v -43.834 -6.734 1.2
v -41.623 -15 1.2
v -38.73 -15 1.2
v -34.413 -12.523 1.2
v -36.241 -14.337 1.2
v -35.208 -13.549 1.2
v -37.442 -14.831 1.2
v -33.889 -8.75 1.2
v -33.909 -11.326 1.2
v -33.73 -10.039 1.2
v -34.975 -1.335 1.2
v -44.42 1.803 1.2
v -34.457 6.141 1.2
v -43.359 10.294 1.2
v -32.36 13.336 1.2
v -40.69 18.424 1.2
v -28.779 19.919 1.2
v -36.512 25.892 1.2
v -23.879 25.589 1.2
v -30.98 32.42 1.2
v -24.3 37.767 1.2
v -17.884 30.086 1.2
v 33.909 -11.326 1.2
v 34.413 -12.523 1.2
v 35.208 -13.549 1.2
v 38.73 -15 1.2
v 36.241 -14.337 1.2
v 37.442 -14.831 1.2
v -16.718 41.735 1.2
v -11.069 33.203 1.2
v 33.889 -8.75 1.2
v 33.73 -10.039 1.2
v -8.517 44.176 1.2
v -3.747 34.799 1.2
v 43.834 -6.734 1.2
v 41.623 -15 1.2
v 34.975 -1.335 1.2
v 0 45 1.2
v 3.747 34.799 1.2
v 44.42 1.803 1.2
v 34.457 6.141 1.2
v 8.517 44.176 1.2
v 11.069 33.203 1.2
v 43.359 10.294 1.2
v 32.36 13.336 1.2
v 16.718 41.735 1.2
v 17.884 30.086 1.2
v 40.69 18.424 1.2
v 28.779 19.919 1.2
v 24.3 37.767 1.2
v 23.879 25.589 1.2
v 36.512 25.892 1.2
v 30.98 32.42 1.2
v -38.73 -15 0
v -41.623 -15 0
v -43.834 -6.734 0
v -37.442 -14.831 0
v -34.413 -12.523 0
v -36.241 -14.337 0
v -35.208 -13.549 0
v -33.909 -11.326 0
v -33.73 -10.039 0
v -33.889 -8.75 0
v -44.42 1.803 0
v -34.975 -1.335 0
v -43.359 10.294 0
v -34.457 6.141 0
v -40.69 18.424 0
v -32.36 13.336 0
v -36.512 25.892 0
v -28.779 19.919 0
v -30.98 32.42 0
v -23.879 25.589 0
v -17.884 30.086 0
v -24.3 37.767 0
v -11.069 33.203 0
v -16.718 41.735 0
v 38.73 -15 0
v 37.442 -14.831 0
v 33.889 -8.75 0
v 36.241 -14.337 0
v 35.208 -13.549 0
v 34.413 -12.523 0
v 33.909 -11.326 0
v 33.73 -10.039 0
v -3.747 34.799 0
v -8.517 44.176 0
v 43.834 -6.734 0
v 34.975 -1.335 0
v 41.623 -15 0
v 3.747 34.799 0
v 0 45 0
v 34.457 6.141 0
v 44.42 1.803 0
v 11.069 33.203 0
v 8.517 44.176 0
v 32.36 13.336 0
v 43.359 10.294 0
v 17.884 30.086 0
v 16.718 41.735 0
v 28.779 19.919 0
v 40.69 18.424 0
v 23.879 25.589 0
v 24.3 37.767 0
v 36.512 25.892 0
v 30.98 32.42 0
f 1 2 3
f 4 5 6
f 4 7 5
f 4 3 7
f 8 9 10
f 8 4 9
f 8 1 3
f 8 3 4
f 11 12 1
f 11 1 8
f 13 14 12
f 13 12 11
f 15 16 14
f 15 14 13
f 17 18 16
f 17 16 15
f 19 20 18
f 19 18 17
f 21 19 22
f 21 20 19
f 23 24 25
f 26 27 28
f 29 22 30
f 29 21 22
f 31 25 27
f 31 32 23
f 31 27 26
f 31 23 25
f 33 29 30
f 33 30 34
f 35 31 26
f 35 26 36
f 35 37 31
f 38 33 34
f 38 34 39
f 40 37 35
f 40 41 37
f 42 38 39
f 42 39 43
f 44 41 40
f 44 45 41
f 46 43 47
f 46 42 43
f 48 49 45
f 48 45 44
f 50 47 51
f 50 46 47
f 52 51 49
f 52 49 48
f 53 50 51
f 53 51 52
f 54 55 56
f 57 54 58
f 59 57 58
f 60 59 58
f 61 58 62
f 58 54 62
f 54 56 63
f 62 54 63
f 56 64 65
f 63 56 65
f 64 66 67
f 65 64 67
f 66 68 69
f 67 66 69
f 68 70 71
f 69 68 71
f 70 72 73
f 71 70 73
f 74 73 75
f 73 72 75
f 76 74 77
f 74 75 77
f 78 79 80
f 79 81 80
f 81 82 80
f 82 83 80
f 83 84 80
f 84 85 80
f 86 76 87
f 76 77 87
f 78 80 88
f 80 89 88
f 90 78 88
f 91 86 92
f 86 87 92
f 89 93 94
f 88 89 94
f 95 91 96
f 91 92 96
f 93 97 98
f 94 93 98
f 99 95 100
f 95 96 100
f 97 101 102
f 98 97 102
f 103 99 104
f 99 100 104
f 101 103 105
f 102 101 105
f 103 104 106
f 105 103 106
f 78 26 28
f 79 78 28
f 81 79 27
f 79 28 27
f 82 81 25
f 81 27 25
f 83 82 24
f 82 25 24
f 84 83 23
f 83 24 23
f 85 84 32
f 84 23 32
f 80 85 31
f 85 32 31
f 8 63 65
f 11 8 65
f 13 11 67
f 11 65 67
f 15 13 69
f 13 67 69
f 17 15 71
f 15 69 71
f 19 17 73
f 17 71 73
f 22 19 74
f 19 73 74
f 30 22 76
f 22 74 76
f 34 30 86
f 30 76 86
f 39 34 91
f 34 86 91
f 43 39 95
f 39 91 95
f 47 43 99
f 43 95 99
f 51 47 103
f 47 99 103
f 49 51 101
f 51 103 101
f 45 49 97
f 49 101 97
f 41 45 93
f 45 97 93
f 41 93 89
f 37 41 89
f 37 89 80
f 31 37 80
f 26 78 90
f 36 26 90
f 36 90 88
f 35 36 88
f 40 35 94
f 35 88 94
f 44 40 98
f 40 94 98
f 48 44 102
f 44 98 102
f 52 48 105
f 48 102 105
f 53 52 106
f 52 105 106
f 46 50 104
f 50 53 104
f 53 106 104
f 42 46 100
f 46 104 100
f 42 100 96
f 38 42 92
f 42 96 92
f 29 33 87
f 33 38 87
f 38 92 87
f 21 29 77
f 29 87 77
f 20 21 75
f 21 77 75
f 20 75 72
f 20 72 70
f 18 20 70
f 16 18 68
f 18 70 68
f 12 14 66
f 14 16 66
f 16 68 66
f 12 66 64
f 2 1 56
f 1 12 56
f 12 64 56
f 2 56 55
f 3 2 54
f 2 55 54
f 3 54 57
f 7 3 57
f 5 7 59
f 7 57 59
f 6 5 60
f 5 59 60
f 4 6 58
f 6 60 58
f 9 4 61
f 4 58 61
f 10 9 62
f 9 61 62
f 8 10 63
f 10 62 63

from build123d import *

# Parameters (mm, degrees)
F1_DEPTH = 1.2
F3_DEPTH = 10
F5_DEPTH = 135
F6_R     = 5
F7_R     = 63.736196
F8_DEPTH = 1.2


with BuildPart() as f1:
    # F0 (on Top) → F1 (new body)
    with BuildSketch(Plane.XY):
        with BuildLine():
            ThreePointArc((-31.622777, -15), (0, 35), (31.622777, -15))
            Line((31.622777, -15), (41.622777, -15))
            ThreePointArc((41.622777, -15), (0, 45), (-41.622777, -15))
            Line((-41.622777, -15), (-31.622777, -15))
        make_face()
    extrude(amount=F1_DEPTH)

    # F2 (on face) → F3 (join)
    with BuildSketch(Plane.XY.offset(1.2)):
        with BuildLine():
            ThreePointArc((-31.622777, -15), (0, 35), (31.622777, -15))
            Line((31.622777, -15), (32.822777, -15))
            ThreePointArc((32.822777, -15), (0, 36.2), (-32.822777, -15))
            Line((-32.822777, -15), (-31.622777, -15))
        make_face()
    extrude(amount=F3_DEPTH)

    # F4 (on face) → F5 (join)
    with BuildSketch(Plane.XY.offset(1.2)):
        with BuildLine():
            Line((40.822777, -15), (41.622777, -15))
            ThreePointArc((41.622777, -15), (0, 45), (-41.622777, -15))
            Line((-41.622777, -15), (-40.822777, -15))
            ThreePointArc((-40.822777, -15), (0, 44.2), (40.822777, -15))
        make_face()
    extrude(amount=F5_DEPTH)

    # F6
    f6_edges = [f1.edges().sort_by_distance(p)[0] for p in [
        (-31.622777, -15, 5.6),
        (31.622777, -15, 5.6),
    ]]
    fillet(f6_edges, radius=F6_R)


with BuildPart() as f8:
    # F7 (on Top) → F8 (new body, through all)
    with BuildSketch(Plane.XY):
        Circle(F7_R)
    extrude(amount=F8_DEPTH)

    # F9: intersect F1
    add(f1.part, mode=Mode.INTERSECT)


solid = f8.part
